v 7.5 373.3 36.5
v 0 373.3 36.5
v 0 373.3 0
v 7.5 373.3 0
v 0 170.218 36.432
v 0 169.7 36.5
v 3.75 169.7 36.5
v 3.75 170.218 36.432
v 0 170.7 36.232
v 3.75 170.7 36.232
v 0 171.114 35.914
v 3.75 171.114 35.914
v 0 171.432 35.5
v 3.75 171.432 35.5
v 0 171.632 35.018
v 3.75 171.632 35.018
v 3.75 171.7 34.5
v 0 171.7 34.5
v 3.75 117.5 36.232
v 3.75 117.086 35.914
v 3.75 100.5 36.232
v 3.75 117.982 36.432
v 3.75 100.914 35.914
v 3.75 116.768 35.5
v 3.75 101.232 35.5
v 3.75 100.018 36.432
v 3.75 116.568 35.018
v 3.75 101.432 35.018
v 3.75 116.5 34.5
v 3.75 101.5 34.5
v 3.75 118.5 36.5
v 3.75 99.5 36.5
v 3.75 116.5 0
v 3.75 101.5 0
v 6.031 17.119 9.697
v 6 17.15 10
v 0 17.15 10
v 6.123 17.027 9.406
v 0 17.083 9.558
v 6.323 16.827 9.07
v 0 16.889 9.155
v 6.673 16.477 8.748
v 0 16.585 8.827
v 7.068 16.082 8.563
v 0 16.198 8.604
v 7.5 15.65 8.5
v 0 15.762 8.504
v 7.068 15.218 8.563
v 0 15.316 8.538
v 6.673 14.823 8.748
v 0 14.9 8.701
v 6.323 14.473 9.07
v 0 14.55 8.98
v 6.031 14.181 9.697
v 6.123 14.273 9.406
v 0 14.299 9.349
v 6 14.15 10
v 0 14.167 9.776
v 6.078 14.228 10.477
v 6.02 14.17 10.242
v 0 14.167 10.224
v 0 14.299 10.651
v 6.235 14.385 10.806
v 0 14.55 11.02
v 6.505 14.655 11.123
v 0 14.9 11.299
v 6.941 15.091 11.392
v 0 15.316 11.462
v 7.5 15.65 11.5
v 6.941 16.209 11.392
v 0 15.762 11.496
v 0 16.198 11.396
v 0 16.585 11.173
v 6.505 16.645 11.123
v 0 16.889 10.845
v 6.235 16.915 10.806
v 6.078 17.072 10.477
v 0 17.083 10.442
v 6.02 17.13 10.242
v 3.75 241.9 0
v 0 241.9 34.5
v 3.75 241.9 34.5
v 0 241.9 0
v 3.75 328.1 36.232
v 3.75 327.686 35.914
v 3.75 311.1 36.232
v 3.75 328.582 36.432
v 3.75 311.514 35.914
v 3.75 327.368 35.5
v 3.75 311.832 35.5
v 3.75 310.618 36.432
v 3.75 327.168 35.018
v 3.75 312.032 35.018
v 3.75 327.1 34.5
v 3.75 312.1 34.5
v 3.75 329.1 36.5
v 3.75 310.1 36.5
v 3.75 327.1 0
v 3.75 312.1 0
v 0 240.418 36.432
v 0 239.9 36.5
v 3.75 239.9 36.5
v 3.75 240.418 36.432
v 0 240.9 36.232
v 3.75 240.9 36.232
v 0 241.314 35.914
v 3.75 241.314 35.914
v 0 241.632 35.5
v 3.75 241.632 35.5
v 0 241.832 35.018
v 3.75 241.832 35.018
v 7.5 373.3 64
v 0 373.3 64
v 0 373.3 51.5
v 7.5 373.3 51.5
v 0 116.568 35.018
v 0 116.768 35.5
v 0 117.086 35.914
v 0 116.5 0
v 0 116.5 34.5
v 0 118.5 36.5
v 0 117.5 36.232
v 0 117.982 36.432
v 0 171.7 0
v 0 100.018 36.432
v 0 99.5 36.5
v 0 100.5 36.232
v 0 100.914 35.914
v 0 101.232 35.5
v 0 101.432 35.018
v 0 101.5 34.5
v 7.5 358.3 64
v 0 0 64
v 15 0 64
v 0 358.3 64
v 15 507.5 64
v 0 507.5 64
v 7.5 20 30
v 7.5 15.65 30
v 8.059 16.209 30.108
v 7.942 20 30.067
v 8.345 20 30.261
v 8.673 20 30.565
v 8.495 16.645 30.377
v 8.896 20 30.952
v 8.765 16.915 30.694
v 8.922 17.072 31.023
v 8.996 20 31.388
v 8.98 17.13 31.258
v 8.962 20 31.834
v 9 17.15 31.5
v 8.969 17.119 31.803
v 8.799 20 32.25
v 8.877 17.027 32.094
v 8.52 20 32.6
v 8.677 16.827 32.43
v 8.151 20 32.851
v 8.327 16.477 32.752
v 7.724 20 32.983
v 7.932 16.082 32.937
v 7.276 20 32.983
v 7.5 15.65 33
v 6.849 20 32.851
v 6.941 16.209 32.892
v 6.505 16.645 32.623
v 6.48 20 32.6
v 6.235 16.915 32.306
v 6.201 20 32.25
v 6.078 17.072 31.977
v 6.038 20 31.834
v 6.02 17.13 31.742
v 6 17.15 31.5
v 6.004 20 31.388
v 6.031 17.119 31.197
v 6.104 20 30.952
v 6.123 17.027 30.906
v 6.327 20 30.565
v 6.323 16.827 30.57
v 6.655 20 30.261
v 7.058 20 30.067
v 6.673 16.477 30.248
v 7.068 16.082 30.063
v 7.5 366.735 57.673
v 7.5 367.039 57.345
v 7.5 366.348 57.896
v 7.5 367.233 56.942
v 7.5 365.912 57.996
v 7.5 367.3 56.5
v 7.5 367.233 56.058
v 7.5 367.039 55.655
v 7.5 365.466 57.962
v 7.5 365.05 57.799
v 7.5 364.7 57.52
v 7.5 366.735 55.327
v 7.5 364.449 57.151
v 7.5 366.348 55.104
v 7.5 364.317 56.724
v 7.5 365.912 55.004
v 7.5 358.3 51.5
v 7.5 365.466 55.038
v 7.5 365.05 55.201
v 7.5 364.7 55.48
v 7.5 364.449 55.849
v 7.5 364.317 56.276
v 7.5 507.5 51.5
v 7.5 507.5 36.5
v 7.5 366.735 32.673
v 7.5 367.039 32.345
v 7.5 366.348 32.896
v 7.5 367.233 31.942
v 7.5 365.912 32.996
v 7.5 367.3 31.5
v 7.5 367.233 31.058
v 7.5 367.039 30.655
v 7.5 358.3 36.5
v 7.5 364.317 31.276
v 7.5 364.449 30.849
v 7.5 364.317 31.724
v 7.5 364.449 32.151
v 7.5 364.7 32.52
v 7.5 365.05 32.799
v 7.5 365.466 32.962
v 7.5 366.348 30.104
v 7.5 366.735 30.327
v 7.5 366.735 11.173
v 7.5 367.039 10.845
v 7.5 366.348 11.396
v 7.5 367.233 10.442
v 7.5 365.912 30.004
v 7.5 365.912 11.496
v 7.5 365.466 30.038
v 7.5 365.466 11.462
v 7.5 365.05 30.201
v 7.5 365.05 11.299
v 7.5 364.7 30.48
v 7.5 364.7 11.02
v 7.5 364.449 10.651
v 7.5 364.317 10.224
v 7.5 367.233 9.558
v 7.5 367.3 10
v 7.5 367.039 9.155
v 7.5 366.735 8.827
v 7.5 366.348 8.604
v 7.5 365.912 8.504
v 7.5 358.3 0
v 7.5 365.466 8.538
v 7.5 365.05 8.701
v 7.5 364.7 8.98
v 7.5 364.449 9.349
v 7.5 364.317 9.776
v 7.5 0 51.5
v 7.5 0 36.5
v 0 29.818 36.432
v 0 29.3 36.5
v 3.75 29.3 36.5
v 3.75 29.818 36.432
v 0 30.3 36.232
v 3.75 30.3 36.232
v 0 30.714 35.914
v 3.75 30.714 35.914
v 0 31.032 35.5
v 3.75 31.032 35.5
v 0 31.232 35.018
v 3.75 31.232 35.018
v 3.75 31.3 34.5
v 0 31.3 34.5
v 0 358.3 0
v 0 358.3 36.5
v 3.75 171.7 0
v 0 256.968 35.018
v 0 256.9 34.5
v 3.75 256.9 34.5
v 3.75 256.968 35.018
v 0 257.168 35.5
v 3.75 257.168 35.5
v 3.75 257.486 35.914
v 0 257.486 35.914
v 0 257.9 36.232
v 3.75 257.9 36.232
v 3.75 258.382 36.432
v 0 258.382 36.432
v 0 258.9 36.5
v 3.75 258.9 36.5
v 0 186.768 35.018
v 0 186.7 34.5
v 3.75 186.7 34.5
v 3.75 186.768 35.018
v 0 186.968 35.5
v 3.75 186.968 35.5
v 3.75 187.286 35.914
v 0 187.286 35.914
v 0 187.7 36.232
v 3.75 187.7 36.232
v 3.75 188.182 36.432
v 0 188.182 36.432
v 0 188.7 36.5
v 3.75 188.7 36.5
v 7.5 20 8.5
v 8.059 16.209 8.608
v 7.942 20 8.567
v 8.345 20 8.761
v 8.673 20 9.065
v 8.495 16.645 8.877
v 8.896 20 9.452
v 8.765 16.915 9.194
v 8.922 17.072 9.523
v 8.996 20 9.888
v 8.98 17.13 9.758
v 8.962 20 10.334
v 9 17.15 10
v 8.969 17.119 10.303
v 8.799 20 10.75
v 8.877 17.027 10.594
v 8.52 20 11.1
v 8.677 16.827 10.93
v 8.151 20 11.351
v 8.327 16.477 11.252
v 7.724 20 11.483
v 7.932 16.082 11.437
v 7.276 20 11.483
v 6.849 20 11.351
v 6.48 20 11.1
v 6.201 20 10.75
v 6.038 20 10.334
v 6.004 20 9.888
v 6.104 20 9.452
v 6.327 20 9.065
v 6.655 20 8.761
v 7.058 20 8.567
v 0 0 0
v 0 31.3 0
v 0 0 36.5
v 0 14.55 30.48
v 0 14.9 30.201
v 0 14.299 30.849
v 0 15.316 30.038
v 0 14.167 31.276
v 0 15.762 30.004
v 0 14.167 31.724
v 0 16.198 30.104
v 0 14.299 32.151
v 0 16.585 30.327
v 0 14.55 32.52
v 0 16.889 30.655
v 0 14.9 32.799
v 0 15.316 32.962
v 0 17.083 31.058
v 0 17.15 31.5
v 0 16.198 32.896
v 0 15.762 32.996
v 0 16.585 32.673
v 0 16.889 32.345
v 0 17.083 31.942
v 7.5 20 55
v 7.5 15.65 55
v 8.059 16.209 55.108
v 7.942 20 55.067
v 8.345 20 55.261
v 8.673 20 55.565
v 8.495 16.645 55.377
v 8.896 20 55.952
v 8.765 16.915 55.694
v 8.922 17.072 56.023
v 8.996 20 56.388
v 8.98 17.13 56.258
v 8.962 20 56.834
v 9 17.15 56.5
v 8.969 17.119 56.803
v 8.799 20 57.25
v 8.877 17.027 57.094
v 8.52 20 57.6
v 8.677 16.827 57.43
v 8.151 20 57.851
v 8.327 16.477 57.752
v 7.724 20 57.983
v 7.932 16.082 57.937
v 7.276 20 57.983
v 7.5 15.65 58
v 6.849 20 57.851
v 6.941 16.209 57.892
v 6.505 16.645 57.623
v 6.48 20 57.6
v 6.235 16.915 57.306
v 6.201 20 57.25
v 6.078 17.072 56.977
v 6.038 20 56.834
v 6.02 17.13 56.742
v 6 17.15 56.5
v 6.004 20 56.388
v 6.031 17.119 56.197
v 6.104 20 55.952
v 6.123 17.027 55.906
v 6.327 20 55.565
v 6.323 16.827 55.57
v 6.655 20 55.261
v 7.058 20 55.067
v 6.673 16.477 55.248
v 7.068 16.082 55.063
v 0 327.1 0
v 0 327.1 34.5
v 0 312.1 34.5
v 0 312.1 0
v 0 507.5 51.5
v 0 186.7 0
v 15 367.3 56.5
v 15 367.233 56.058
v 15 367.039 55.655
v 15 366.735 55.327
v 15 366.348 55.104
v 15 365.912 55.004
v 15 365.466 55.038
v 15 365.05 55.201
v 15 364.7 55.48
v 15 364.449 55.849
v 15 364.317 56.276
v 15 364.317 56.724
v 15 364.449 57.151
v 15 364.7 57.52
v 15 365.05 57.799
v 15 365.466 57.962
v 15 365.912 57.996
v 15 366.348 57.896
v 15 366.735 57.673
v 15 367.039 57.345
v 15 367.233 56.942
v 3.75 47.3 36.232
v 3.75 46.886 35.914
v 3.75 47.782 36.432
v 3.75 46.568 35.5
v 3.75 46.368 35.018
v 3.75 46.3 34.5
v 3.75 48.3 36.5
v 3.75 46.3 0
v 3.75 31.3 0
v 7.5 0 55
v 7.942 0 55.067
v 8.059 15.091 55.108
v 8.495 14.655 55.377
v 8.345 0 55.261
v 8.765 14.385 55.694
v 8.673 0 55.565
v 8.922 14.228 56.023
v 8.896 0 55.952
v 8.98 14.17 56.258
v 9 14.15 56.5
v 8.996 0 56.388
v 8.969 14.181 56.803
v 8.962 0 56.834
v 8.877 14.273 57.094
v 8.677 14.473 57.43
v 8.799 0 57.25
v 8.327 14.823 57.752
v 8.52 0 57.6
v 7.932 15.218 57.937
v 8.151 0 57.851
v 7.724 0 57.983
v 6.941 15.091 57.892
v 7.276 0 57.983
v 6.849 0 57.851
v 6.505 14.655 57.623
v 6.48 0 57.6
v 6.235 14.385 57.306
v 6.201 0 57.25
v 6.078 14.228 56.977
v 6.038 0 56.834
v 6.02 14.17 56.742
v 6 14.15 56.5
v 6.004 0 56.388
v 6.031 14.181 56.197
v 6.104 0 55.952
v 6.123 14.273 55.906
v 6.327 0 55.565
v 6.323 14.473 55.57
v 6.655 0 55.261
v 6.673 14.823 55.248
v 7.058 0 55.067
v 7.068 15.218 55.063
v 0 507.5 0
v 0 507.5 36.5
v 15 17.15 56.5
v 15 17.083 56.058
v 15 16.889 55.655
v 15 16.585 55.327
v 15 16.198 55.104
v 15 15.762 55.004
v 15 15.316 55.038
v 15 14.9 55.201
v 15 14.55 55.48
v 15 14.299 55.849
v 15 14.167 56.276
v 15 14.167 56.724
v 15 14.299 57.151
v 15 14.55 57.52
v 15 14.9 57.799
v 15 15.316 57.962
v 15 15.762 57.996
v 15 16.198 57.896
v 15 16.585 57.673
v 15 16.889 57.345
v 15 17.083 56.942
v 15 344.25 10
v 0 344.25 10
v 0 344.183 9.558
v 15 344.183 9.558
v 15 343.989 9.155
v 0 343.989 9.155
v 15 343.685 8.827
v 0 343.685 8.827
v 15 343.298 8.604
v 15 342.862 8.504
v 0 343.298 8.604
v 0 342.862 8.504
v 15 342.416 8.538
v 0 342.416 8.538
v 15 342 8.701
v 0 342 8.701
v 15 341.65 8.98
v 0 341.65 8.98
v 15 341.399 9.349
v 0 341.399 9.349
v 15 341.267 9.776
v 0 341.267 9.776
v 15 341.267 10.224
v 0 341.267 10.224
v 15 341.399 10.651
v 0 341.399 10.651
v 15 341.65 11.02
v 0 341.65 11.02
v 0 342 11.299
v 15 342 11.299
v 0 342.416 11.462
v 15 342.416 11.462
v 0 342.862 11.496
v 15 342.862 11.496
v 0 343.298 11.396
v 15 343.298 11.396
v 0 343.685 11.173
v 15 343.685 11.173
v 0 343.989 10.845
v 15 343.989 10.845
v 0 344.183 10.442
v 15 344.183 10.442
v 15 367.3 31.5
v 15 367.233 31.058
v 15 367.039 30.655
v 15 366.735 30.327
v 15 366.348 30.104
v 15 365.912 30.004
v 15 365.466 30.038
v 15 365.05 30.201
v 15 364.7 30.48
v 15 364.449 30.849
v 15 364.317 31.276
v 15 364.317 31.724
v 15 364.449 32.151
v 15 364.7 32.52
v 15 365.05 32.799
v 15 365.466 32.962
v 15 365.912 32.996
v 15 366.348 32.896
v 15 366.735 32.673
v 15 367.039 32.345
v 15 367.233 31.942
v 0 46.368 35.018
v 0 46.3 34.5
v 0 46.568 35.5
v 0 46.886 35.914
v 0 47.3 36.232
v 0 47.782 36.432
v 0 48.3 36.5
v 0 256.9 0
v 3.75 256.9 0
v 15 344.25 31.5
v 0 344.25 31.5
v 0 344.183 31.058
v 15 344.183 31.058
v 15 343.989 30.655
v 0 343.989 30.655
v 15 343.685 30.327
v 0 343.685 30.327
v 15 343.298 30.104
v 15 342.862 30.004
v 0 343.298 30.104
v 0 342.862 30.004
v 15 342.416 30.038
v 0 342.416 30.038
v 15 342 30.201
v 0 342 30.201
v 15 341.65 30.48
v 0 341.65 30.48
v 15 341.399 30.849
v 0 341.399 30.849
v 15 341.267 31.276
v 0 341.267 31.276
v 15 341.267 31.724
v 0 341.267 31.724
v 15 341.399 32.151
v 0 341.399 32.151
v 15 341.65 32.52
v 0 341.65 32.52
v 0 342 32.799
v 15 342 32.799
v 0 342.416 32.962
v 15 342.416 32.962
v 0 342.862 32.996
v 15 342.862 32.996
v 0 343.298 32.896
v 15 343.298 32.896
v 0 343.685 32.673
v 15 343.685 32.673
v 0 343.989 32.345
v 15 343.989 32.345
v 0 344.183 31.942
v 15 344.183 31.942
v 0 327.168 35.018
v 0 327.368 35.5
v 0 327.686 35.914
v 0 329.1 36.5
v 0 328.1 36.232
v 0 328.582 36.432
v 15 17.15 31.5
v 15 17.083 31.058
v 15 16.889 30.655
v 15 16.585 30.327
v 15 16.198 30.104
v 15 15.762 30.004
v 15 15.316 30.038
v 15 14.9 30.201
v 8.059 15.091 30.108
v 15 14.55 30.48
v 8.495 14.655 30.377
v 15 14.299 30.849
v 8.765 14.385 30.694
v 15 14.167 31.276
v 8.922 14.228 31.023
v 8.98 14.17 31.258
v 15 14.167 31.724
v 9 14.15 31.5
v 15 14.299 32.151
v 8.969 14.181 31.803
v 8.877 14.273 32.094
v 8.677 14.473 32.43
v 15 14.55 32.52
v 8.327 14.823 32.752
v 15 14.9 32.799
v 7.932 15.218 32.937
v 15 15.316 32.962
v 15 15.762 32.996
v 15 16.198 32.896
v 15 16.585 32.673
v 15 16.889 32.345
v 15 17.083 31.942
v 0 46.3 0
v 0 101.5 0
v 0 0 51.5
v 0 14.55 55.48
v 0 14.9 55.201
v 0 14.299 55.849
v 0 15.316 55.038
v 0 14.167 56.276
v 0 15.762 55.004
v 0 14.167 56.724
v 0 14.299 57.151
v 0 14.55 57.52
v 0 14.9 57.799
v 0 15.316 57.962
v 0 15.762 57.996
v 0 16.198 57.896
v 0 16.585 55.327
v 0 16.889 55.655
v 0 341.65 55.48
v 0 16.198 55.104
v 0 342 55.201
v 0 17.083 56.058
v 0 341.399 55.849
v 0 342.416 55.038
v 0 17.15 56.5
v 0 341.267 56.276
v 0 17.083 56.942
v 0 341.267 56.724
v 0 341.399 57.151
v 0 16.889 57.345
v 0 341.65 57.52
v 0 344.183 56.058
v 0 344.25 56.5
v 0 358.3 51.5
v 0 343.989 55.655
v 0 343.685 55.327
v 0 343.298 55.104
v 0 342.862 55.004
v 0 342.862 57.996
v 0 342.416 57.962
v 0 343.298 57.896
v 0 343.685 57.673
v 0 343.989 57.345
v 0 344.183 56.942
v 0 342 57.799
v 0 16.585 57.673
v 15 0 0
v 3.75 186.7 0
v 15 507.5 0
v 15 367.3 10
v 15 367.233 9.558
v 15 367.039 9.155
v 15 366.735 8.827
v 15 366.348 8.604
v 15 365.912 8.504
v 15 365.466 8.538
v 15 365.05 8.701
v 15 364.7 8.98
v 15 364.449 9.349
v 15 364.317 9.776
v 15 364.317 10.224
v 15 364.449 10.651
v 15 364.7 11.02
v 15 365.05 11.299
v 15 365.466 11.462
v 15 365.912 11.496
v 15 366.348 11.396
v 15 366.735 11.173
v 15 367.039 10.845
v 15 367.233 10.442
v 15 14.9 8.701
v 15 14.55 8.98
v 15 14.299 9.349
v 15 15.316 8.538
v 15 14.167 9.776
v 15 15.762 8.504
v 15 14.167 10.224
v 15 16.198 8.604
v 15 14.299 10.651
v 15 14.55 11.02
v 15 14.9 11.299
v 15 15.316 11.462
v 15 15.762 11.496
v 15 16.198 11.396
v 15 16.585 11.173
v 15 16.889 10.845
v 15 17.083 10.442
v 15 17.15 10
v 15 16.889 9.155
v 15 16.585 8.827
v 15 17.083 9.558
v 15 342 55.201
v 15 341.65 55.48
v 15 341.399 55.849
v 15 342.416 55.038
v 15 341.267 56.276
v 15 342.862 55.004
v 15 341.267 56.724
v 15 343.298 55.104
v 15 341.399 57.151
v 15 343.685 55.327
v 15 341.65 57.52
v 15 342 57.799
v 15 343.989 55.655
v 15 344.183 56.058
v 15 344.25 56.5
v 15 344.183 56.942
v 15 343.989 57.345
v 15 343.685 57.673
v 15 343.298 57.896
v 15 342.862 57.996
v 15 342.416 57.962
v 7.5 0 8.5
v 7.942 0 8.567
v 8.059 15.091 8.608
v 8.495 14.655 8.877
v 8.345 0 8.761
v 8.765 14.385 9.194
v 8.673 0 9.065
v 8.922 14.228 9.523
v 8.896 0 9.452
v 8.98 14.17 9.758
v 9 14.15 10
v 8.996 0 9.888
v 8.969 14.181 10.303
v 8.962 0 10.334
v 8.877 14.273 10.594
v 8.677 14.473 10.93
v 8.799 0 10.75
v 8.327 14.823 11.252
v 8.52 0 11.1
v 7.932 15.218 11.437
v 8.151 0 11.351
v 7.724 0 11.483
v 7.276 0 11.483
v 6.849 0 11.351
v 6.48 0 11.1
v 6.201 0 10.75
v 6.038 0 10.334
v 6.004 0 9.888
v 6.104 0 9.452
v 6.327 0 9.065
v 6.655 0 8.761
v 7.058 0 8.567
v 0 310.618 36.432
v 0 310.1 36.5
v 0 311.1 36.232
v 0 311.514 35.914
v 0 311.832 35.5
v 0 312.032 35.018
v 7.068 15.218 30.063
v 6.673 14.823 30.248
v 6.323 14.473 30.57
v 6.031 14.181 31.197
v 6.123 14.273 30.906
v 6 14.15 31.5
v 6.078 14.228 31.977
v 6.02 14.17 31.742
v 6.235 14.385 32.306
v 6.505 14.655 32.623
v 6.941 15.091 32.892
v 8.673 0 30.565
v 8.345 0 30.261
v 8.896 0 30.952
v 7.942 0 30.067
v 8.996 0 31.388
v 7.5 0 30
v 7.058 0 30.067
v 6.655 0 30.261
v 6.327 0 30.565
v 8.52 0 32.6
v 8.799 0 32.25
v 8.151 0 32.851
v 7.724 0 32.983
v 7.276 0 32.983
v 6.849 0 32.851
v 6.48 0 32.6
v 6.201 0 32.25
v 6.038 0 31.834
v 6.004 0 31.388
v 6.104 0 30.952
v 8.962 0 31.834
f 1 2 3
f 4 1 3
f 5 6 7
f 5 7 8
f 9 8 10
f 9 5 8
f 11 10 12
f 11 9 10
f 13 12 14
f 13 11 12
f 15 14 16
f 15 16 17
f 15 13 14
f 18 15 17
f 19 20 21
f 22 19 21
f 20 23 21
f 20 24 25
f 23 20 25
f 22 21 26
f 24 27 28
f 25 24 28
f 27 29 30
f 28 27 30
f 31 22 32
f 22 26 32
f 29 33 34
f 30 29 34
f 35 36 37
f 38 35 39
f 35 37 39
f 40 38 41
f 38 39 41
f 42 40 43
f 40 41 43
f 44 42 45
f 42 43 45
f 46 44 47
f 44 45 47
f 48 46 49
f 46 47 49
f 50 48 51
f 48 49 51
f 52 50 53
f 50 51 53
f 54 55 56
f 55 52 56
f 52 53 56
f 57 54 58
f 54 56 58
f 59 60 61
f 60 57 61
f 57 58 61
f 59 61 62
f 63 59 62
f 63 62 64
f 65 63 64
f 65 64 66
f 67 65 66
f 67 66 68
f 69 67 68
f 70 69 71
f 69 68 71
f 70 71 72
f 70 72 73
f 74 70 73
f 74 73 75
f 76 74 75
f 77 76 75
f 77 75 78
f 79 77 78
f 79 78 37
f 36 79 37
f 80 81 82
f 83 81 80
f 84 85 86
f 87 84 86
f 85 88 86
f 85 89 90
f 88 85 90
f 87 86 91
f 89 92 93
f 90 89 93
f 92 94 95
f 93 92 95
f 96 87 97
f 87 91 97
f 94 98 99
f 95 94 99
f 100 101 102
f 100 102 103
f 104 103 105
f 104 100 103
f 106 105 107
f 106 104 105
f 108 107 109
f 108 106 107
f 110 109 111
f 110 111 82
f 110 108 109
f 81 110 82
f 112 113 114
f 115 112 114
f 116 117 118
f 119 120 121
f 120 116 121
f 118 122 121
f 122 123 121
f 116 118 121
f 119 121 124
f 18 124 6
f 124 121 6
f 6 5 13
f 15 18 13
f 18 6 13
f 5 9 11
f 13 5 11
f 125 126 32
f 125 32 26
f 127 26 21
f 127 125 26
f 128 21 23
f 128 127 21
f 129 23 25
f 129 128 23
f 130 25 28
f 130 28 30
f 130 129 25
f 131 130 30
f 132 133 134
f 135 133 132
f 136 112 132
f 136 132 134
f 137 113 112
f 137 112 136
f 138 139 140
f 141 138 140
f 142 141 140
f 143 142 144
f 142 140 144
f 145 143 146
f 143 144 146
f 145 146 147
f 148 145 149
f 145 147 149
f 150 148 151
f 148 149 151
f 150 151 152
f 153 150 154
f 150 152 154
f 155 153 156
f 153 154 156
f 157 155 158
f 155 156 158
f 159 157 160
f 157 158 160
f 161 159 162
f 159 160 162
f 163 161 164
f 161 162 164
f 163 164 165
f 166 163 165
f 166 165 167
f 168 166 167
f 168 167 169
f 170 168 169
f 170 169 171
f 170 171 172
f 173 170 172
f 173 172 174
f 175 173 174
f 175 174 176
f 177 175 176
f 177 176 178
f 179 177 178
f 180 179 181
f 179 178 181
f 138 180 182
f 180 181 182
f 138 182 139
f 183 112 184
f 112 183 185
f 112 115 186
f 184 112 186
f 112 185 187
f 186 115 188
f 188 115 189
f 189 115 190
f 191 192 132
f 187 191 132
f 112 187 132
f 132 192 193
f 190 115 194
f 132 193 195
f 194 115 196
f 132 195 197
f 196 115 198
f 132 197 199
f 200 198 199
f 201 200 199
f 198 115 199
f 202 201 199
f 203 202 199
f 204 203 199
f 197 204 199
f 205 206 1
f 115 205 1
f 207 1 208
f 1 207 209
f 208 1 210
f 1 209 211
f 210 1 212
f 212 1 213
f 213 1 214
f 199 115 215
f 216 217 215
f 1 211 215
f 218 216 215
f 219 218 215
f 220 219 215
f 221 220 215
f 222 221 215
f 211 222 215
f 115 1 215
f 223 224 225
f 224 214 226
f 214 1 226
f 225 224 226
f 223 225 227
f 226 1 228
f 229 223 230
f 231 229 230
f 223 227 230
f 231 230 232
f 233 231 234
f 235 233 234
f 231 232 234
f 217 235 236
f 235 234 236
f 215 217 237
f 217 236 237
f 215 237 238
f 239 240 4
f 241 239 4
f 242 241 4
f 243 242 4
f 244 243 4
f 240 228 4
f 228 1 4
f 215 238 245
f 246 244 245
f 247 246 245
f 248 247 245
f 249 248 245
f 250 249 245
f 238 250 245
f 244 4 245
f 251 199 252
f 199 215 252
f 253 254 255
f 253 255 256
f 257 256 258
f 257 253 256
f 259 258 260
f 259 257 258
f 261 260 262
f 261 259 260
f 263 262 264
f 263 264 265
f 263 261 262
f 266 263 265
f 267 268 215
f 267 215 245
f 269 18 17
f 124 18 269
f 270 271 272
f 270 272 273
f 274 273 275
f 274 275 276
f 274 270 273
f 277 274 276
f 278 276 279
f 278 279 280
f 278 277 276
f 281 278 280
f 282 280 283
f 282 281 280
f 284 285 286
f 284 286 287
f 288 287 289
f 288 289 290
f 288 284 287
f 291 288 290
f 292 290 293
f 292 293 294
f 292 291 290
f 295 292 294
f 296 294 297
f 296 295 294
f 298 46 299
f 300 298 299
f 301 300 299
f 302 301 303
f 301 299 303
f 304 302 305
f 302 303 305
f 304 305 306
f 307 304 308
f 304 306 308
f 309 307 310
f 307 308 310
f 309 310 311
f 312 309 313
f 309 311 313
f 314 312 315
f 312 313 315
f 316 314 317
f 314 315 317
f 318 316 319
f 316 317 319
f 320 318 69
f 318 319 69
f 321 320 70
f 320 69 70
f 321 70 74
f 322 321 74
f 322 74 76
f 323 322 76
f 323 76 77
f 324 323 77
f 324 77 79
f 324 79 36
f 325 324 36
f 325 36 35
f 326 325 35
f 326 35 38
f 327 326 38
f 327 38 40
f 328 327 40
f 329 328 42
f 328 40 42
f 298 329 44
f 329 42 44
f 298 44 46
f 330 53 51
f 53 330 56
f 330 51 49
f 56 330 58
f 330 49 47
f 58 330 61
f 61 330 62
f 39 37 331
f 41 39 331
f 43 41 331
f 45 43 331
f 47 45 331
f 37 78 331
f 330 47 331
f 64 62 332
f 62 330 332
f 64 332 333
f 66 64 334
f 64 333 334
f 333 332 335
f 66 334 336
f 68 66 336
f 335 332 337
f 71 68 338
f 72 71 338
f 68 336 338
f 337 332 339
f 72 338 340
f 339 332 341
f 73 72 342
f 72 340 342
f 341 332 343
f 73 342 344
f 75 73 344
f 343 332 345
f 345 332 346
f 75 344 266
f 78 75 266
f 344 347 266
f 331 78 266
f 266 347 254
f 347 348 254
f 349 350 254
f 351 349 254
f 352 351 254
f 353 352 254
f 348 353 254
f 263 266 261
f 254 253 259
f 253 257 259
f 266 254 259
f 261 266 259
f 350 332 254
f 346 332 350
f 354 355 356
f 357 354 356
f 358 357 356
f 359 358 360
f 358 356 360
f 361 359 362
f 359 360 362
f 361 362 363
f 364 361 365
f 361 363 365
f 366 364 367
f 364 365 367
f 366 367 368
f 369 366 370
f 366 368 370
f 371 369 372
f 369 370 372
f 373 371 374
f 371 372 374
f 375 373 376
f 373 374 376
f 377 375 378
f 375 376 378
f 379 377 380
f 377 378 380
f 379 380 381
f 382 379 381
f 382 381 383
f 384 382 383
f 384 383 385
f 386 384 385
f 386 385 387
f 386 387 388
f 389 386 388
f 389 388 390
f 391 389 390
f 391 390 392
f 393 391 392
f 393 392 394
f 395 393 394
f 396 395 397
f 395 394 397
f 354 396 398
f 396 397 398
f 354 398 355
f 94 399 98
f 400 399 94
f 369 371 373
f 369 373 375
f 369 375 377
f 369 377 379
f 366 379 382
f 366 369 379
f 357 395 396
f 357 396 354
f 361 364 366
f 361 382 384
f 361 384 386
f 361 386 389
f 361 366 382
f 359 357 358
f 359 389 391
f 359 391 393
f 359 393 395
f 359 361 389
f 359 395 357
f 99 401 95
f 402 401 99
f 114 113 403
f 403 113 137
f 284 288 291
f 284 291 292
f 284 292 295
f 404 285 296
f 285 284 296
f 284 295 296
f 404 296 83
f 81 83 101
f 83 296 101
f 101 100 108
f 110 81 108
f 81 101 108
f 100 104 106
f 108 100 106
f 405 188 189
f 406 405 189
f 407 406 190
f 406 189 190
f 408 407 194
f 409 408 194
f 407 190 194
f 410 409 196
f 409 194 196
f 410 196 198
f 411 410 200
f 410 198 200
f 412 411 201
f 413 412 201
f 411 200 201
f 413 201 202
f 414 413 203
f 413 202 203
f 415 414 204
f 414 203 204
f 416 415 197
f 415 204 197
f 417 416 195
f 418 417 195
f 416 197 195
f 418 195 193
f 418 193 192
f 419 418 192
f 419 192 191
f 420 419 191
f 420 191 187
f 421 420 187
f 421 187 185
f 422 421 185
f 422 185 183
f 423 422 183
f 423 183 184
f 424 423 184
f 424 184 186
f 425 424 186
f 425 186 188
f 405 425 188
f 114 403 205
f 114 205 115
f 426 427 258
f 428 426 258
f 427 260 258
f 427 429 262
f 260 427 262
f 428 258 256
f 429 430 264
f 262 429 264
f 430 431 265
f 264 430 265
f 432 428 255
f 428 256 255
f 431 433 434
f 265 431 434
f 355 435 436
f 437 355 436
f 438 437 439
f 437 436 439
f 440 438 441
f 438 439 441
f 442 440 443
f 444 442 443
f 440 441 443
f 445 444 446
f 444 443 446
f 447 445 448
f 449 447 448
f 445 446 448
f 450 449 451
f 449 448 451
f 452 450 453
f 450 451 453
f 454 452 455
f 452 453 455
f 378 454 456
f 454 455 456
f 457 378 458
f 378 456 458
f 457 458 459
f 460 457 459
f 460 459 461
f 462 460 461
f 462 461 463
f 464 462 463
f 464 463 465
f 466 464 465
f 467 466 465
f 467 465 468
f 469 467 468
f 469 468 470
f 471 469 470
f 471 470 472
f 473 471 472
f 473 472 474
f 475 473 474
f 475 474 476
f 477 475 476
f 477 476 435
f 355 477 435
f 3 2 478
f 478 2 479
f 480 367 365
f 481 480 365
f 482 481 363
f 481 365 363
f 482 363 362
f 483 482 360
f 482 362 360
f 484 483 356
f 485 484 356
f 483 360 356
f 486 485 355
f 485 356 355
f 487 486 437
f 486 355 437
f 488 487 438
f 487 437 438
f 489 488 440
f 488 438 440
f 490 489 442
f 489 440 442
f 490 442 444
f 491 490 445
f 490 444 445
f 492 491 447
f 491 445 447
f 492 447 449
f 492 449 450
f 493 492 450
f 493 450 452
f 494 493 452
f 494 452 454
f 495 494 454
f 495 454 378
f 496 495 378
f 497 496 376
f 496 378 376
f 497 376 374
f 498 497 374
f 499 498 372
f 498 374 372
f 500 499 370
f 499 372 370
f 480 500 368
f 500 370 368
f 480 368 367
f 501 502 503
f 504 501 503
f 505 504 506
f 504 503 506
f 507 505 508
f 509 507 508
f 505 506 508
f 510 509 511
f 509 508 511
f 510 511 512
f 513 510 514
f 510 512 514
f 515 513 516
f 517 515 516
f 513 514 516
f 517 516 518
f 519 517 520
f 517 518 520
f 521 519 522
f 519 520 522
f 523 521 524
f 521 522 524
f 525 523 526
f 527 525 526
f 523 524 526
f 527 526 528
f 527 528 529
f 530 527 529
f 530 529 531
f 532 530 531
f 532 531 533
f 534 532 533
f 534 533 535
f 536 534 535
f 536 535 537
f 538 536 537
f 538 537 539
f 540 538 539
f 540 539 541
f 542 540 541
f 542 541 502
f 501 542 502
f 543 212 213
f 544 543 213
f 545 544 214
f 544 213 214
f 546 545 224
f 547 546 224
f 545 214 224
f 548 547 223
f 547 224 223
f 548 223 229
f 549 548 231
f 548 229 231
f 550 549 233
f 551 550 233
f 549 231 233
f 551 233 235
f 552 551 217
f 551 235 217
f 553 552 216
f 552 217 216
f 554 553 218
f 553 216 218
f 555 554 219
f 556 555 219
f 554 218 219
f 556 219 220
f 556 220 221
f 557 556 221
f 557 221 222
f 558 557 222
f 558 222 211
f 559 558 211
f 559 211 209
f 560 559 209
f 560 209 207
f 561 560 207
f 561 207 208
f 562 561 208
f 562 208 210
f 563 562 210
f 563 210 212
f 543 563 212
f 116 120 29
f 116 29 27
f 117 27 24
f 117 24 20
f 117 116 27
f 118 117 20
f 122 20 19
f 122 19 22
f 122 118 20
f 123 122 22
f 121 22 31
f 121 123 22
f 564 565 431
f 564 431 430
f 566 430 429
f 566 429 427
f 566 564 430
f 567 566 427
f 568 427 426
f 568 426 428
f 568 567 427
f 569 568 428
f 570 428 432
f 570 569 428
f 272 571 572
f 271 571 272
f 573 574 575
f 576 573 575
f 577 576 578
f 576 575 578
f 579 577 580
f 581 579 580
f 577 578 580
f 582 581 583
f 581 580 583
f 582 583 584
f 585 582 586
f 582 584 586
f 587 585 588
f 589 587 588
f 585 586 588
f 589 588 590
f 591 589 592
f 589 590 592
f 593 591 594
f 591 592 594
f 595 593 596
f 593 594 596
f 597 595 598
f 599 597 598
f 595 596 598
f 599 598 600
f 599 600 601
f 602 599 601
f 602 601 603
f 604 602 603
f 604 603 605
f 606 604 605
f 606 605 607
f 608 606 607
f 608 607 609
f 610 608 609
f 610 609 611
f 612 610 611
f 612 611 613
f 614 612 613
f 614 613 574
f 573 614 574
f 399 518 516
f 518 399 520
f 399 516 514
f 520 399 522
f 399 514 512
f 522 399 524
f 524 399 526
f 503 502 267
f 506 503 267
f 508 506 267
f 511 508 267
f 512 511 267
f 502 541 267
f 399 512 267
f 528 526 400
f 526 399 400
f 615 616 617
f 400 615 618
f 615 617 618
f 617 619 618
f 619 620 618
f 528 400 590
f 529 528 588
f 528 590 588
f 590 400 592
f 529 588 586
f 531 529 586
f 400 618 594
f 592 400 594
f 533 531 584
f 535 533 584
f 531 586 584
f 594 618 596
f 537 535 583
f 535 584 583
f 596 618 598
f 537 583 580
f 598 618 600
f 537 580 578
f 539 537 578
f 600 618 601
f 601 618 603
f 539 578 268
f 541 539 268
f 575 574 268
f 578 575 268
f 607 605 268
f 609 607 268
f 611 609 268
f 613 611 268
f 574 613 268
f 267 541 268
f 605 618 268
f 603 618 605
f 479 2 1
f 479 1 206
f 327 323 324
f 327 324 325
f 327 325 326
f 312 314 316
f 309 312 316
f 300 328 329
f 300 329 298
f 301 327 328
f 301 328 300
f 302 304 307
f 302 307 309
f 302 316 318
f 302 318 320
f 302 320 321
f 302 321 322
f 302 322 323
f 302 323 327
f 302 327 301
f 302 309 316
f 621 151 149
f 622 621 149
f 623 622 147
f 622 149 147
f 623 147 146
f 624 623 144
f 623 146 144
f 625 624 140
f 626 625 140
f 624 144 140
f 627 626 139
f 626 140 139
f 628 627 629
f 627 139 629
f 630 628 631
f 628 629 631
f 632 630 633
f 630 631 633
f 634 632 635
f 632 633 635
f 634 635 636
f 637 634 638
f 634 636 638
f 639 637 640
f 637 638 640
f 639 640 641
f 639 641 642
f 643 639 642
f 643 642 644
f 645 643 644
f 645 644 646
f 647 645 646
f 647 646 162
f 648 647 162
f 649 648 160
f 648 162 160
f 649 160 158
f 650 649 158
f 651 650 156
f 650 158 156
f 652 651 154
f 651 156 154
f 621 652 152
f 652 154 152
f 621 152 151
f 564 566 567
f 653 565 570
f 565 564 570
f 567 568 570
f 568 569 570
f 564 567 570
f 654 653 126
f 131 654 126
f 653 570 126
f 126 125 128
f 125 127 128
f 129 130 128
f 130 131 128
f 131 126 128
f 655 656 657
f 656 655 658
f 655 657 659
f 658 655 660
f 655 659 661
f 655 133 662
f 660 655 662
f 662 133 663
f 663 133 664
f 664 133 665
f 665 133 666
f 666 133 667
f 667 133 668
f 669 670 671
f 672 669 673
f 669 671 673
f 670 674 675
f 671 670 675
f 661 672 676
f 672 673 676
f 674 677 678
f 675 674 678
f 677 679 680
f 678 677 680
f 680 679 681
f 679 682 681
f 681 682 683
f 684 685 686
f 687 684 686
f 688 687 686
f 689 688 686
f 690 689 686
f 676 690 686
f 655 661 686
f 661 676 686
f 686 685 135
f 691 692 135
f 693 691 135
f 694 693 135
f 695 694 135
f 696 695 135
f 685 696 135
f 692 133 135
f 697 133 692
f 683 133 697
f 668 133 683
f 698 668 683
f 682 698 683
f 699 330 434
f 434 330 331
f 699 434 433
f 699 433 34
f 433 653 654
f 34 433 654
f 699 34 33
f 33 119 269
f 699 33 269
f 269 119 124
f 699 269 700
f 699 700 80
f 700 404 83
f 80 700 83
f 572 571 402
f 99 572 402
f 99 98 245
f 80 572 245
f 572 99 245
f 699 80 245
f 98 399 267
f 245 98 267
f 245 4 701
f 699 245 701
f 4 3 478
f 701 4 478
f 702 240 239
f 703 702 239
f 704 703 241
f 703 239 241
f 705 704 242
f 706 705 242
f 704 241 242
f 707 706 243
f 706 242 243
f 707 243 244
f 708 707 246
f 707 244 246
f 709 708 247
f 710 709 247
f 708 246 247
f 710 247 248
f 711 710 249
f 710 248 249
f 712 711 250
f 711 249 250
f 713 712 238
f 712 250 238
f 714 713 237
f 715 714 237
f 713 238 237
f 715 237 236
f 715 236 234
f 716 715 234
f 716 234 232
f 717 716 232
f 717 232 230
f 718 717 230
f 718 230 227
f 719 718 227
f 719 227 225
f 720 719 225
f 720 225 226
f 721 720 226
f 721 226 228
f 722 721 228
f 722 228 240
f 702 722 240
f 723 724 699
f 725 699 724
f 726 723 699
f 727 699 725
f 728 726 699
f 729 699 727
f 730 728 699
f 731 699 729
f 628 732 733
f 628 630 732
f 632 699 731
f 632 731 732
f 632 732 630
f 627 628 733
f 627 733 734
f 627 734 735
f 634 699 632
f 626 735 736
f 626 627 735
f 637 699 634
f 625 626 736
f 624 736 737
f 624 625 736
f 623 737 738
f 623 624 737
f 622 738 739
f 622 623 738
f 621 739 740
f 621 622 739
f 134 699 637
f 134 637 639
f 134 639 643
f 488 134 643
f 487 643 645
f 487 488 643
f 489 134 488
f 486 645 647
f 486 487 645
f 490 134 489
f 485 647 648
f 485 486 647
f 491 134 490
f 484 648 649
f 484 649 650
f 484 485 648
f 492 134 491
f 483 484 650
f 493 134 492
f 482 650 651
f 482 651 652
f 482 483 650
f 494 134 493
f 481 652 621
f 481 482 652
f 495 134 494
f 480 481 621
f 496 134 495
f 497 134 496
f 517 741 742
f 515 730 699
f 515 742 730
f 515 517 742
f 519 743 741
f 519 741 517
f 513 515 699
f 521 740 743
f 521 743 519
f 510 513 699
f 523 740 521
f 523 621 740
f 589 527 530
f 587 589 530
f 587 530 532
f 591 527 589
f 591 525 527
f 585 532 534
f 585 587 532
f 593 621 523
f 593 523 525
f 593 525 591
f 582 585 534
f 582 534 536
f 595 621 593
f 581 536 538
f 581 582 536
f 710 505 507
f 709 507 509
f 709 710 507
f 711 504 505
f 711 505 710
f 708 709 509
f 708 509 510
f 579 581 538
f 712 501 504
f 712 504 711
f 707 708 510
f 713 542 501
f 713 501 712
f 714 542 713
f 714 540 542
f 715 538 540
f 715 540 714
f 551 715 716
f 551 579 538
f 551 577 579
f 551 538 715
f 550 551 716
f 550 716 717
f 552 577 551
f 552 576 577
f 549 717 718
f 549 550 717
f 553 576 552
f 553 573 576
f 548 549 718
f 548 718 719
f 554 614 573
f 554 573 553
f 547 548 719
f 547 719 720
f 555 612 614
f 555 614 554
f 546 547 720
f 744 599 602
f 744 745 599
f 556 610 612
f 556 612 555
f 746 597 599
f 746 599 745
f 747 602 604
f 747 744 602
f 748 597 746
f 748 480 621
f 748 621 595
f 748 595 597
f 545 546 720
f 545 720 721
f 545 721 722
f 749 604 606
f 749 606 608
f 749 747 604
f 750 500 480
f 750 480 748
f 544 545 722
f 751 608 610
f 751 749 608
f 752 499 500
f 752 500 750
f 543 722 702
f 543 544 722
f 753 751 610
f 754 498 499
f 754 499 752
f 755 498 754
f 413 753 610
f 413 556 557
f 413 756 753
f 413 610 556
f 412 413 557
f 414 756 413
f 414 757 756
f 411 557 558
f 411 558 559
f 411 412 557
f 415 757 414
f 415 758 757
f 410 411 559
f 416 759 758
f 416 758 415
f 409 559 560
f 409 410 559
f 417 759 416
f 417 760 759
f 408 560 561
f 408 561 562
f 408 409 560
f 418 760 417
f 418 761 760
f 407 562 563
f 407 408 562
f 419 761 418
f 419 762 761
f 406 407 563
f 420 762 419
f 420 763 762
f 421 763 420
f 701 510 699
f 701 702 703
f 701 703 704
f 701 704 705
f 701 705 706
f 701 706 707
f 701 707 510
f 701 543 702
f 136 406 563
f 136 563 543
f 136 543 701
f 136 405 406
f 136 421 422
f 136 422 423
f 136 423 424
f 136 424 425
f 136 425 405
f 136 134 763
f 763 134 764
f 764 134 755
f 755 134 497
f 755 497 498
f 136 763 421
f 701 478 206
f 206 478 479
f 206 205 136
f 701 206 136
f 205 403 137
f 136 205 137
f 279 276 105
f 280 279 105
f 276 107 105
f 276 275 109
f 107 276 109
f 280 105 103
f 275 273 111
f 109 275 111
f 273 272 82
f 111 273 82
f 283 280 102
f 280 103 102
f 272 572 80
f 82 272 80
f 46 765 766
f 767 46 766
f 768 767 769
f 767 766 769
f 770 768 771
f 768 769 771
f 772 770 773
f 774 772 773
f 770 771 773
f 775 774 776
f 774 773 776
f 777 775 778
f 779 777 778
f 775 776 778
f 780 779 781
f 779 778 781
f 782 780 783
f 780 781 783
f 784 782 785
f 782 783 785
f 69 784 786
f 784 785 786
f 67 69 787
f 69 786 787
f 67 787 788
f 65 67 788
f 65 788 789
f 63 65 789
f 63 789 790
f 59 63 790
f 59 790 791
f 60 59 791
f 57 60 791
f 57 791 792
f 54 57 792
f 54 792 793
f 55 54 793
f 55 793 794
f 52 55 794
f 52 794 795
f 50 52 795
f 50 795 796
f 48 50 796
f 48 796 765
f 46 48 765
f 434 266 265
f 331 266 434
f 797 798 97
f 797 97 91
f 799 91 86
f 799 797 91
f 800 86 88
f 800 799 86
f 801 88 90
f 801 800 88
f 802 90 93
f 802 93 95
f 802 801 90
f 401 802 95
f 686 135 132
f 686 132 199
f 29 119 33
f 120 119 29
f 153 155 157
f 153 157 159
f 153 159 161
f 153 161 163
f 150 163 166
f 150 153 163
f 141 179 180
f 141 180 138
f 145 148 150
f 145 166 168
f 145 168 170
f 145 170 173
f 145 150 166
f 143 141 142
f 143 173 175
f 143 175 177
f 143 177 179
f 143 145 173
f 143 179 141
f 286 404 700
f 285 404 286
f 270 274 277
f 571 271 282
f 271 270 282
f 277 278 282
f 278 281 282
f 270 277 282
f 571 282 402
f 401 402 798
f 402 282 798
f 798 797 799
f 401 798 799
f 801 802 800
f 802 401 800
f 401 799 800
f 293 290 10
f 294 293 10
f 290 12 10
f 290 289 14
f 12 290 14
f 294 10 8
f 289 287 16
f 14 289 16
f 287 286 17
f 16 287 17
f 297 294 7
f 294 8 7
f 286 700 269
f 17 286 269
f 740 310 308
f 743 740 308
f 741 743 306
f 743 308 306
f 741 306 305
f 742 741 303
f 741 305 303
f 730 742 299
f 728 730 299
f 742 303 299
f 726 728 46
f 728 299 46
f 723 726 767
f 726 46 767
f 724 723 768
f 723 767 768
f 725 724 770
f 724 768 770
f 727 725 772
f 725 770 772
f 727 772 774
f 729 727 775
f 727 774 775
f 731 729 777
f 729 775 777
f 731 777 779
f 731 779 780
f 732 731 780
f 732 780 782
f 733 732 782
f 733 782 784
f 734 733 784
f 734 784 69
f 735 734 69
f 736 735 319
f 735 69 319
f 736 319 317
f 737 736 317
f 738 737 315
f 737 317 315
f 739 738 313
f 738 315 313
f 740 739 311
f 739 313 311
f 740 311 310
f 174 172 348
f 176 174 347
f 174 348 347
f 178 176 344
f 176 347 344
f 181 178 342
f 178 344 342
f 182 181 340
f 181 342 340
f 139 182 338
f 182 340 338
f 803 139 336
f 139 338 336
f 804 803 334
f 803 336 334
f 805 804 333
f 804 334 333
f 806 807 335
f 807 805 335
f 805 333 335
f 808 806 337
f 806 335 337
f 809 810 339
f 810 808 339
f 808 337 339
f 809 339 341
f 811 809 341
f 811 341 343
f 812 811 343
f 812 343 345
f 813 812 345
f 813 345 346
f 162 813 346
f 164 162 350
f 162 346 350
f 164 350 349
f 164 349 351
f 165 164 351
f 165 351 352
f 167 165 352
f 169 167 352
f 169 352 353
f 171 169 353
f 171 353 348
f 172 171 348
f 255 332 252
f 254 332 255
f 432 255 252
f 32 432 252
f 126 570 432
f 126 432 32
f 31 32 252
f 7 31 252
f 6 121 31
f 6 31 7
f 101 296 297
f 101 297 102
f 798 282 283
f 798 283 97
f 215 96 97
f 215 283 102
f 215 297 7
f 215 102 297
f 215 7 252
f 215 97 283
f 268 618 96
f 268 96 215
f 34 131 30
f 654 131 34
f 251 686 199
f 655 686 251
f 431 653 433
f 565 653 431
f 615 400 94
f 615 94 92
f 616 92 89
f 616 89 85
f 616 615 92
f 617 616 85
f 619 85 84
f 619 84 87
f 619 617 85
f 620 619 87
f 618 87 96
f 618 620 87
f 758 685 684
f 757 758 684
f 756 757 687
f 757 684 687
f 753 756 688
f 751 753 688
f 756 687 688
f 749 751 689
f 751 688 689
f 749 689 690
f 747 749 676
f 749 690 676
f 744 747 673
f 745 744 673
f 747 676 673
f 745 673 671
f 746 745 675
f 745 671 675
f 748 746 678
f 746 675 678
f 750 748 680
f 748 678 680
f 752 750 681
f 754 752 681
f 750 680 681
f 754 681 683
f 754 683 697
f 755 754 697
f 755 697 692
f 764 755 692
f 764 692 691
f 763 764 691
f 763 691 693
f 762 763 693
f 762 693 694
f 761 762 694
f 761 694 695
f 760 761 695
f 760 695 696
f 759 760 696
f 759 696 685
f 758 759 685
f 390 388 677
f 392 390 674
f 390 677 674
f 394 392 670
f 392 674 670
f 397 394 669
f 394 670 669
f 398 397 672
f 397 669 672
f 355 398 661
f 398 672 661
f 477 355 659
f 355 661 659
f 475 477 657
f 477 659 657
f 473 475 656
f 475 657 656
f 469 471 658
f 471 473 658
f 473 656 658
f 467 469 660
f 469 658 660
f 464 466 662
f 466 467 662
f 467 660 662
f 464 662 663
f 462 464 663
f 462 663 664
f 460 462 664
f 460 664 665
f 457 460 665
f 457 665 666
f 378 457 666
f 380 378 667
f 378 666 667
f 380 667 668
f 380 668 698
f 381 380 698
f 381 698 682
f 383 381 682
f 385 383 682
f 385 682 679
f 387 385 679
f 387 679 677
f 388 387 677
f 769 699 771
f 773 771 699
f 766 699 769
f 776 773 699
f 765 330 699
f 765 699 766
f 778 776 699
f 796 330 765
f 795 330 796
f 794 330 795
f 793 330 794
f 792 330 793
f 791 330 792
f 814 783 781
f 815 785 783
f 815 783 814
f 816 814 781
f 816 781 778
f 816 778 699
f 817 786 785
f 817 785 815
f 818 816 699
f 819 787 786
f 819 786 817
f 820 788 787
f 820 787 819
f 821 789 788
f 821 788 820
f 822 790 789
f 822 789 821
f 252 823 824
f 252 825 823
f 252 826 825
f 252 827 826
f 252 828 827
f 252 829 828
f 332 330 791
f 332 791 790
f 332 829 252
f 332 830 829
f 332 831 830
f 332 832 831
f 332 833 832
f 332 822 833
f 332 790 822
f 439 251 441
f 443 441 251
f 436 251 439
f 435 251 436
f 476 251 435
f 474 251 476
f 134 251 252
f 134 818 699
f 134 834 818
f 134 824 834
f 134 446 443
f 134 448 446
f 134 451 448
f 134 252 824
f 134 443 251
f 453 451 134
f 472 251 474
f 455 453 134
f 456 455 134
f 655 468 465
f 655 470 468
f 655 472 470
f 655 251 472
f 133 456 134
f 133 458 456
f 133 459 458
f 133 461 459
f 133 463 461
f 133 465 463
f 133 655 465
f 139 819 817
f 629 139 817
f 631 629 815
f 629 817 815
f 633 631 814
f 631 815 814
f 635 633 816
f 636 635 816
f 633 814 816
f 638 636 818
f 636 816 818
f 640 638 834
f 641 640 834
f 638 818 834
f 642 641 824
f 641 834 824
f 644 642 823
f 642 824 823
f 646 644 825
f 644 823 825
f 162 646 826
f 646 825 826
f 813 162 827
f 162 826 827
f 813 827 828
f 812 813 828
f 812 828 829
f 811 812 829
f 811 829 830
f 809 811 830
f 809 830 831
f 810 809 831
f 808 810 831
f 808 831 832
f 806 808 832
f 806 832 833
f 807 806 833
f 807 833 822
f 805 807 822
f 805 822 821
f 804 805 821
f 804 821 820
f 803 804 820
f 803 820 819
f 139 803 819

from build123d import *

# Parameters (mm, degrees)
SKETCH_W             = 507.5
SKETCH_H             = 64
PAD_DEPTH            = 15
POCKET_DEPTH         = 7.5
POCKET001_DEPTH      = 3.75
LINEARPATTERN_COUNT  = 5
LINEARPATTERN_PITCH  = 70.2
SKETCH003_W          = 15
SKETCH003_H          = 64
POCKET002_DEPTH      = 7.5
SKETCH004_R          = 1.5
POCKET003_DEPTH      = 15.001
POCKET003_DEPTH_BACK = 0.001
SKETCH005_R          = 1.5
POCKET004_DEPTH      = 20
SKETCH006_R          = 1.5
POCKET005_DEPTH      = 15.001


with BuildPart() as part:
    # Sketch → Pad (new body)
    with BuildSketch(Plane.YZ):
        with Locations((253.75, 32)):
            Rectangle(SKETCH_W, SKETCH_H)
    extrude(amount=PAD_DEPTH)

    # Sketch001 (on Face5 of Pad) → Pocket (cut)
    with BuildSketch(Plane(origin=(0, 0, 0), x_dir=(0, 1, 0), z_dir=(-1, 0, 0))):
        Polygon((0, -36.5), (507.5, -36.5), (507.5, -51.5), (0, -51.5), (0, -44), align=None)
    extrude(amount=-POCKET_DEPTH, mode=Mode.SUBTRACT)

    # Sketch002 (on Face4 of Pocket) → Pocket001 (cut)
    with BuildSketch(Plane(origin=(0, 0, 0), x_dir=(0, 1, 0), z_dir=(-1, 0, 0))):
        with BuildLine():
            Line((31.3, 0), (46.3, 0))
            Line((46.3, 0), (46.3, -34.5))
            ThreePointArc((46.3, -34.5), (46.885786, -35.914214), (48.3, -36.5))
            Line((29.3, -36.5), (48.3, -36.5))
            ThreePointArc((29.3, -36.5), (30.714214, -35.914214), (31.3, -34.5))
            Line((31.3, -34.5), (31.3, 0))
        make_face()
    pocket001 = extrude(amount=-POCKET001_DEPTH, mode=Mode.SUBTRACT)

    # LinearPattern: Pocket001 ×5
    with Locations(*[(0, i * LINEARPATTERN_PITCH, 0) for i in range(1, LINEARPATTERN_COUNT)]):
        add(pocket001, mode=Mode.SUBTRACT)

    # Sketch003 (on Face2 of MultiTransform) → Pocket002 (cut)
    with BuildSketch(Plane(origin=(0, 0, 0), x_dir=(0, 1, 0), z_dir=(-1, 0, 0))):
        with Locations((365.8, -32)):
            Rectangle(SKETCH003_W, SKETCH003_H)
    extrude(amount=-POCKET002_DEPTH, mode=Mode.SUBTRACT)

    # Sketch004 (on Face2 of Pocket002) → Pocket003 (cut, two sides)
    with BuildSketch(Plane(origin=(0, 0, 0), x_dir=(0, 1, 0), z_dir=(-1, 0, 0))) as pocket003_sk:
        with Locations((365.8, -10)):
            Circle(SKETCH004_R)
        with Locations((365.8, -31.5)):
            Circle(SKETCH004_R)
        with Locations((365.8, -56.5)):
            Circle(SKETCH004_R)
    extrude(amount=-POCKET003_DEPTH, mode=Mode.SUBTRACT)
    extrude(pocket003_sk.sketch, amount=POCKET003_DEPTH_BACK, mode=Mode.SUBTRACT)

    # Sketch005 (on Face29 of Pocket003) → Pocket004 (cut)
    with BuildSketch(Plane(origin=(0, 0, 0), x_dir=(0, 0, -1), z_dir=(0, -1, 0))):
        with Locations((-56.5, 7.5)):
            Circle(SKETCH005_R)
        with Locations((-31.5, 7.5)):
            Circle(SKETCH005_R)
        with Locations((-10, 7.5)):
            Circle(SKETCH005_R)
    extrude(amount=-POCKET004_DEPTH, mode=Mode.SUBTRACT)

    # Sketch006 (on Face2 of Pocket003) → Pocket005 (cut, through all)
    with BuildSketch(Plane(origin=(0, 0, 0), x_dir=(0, 1, 0), z_dir=(-1, 0, 0))):
        with Locations((15.65, -10)):
            Circle(SKETCH006_R)
        with Locations((15.65, -31.5)):
            Circle(SKETCH006_R)
        with Locations((15.65, -56.5)):
            Circle(SKETCH006_R)
        with Locations((342.75, -10)):
            Circle(SKETCH006_R)
        with Locations((342.75, -31.5)):
            Circle(SKETCH006_R)
        with Locations((342.75, -56.5)):
            Circle(SKETCH006_R)
    extrude(amount=-POCKET005_DEPTH, mode=Mode.SUBTRACT)


solid = part.part
